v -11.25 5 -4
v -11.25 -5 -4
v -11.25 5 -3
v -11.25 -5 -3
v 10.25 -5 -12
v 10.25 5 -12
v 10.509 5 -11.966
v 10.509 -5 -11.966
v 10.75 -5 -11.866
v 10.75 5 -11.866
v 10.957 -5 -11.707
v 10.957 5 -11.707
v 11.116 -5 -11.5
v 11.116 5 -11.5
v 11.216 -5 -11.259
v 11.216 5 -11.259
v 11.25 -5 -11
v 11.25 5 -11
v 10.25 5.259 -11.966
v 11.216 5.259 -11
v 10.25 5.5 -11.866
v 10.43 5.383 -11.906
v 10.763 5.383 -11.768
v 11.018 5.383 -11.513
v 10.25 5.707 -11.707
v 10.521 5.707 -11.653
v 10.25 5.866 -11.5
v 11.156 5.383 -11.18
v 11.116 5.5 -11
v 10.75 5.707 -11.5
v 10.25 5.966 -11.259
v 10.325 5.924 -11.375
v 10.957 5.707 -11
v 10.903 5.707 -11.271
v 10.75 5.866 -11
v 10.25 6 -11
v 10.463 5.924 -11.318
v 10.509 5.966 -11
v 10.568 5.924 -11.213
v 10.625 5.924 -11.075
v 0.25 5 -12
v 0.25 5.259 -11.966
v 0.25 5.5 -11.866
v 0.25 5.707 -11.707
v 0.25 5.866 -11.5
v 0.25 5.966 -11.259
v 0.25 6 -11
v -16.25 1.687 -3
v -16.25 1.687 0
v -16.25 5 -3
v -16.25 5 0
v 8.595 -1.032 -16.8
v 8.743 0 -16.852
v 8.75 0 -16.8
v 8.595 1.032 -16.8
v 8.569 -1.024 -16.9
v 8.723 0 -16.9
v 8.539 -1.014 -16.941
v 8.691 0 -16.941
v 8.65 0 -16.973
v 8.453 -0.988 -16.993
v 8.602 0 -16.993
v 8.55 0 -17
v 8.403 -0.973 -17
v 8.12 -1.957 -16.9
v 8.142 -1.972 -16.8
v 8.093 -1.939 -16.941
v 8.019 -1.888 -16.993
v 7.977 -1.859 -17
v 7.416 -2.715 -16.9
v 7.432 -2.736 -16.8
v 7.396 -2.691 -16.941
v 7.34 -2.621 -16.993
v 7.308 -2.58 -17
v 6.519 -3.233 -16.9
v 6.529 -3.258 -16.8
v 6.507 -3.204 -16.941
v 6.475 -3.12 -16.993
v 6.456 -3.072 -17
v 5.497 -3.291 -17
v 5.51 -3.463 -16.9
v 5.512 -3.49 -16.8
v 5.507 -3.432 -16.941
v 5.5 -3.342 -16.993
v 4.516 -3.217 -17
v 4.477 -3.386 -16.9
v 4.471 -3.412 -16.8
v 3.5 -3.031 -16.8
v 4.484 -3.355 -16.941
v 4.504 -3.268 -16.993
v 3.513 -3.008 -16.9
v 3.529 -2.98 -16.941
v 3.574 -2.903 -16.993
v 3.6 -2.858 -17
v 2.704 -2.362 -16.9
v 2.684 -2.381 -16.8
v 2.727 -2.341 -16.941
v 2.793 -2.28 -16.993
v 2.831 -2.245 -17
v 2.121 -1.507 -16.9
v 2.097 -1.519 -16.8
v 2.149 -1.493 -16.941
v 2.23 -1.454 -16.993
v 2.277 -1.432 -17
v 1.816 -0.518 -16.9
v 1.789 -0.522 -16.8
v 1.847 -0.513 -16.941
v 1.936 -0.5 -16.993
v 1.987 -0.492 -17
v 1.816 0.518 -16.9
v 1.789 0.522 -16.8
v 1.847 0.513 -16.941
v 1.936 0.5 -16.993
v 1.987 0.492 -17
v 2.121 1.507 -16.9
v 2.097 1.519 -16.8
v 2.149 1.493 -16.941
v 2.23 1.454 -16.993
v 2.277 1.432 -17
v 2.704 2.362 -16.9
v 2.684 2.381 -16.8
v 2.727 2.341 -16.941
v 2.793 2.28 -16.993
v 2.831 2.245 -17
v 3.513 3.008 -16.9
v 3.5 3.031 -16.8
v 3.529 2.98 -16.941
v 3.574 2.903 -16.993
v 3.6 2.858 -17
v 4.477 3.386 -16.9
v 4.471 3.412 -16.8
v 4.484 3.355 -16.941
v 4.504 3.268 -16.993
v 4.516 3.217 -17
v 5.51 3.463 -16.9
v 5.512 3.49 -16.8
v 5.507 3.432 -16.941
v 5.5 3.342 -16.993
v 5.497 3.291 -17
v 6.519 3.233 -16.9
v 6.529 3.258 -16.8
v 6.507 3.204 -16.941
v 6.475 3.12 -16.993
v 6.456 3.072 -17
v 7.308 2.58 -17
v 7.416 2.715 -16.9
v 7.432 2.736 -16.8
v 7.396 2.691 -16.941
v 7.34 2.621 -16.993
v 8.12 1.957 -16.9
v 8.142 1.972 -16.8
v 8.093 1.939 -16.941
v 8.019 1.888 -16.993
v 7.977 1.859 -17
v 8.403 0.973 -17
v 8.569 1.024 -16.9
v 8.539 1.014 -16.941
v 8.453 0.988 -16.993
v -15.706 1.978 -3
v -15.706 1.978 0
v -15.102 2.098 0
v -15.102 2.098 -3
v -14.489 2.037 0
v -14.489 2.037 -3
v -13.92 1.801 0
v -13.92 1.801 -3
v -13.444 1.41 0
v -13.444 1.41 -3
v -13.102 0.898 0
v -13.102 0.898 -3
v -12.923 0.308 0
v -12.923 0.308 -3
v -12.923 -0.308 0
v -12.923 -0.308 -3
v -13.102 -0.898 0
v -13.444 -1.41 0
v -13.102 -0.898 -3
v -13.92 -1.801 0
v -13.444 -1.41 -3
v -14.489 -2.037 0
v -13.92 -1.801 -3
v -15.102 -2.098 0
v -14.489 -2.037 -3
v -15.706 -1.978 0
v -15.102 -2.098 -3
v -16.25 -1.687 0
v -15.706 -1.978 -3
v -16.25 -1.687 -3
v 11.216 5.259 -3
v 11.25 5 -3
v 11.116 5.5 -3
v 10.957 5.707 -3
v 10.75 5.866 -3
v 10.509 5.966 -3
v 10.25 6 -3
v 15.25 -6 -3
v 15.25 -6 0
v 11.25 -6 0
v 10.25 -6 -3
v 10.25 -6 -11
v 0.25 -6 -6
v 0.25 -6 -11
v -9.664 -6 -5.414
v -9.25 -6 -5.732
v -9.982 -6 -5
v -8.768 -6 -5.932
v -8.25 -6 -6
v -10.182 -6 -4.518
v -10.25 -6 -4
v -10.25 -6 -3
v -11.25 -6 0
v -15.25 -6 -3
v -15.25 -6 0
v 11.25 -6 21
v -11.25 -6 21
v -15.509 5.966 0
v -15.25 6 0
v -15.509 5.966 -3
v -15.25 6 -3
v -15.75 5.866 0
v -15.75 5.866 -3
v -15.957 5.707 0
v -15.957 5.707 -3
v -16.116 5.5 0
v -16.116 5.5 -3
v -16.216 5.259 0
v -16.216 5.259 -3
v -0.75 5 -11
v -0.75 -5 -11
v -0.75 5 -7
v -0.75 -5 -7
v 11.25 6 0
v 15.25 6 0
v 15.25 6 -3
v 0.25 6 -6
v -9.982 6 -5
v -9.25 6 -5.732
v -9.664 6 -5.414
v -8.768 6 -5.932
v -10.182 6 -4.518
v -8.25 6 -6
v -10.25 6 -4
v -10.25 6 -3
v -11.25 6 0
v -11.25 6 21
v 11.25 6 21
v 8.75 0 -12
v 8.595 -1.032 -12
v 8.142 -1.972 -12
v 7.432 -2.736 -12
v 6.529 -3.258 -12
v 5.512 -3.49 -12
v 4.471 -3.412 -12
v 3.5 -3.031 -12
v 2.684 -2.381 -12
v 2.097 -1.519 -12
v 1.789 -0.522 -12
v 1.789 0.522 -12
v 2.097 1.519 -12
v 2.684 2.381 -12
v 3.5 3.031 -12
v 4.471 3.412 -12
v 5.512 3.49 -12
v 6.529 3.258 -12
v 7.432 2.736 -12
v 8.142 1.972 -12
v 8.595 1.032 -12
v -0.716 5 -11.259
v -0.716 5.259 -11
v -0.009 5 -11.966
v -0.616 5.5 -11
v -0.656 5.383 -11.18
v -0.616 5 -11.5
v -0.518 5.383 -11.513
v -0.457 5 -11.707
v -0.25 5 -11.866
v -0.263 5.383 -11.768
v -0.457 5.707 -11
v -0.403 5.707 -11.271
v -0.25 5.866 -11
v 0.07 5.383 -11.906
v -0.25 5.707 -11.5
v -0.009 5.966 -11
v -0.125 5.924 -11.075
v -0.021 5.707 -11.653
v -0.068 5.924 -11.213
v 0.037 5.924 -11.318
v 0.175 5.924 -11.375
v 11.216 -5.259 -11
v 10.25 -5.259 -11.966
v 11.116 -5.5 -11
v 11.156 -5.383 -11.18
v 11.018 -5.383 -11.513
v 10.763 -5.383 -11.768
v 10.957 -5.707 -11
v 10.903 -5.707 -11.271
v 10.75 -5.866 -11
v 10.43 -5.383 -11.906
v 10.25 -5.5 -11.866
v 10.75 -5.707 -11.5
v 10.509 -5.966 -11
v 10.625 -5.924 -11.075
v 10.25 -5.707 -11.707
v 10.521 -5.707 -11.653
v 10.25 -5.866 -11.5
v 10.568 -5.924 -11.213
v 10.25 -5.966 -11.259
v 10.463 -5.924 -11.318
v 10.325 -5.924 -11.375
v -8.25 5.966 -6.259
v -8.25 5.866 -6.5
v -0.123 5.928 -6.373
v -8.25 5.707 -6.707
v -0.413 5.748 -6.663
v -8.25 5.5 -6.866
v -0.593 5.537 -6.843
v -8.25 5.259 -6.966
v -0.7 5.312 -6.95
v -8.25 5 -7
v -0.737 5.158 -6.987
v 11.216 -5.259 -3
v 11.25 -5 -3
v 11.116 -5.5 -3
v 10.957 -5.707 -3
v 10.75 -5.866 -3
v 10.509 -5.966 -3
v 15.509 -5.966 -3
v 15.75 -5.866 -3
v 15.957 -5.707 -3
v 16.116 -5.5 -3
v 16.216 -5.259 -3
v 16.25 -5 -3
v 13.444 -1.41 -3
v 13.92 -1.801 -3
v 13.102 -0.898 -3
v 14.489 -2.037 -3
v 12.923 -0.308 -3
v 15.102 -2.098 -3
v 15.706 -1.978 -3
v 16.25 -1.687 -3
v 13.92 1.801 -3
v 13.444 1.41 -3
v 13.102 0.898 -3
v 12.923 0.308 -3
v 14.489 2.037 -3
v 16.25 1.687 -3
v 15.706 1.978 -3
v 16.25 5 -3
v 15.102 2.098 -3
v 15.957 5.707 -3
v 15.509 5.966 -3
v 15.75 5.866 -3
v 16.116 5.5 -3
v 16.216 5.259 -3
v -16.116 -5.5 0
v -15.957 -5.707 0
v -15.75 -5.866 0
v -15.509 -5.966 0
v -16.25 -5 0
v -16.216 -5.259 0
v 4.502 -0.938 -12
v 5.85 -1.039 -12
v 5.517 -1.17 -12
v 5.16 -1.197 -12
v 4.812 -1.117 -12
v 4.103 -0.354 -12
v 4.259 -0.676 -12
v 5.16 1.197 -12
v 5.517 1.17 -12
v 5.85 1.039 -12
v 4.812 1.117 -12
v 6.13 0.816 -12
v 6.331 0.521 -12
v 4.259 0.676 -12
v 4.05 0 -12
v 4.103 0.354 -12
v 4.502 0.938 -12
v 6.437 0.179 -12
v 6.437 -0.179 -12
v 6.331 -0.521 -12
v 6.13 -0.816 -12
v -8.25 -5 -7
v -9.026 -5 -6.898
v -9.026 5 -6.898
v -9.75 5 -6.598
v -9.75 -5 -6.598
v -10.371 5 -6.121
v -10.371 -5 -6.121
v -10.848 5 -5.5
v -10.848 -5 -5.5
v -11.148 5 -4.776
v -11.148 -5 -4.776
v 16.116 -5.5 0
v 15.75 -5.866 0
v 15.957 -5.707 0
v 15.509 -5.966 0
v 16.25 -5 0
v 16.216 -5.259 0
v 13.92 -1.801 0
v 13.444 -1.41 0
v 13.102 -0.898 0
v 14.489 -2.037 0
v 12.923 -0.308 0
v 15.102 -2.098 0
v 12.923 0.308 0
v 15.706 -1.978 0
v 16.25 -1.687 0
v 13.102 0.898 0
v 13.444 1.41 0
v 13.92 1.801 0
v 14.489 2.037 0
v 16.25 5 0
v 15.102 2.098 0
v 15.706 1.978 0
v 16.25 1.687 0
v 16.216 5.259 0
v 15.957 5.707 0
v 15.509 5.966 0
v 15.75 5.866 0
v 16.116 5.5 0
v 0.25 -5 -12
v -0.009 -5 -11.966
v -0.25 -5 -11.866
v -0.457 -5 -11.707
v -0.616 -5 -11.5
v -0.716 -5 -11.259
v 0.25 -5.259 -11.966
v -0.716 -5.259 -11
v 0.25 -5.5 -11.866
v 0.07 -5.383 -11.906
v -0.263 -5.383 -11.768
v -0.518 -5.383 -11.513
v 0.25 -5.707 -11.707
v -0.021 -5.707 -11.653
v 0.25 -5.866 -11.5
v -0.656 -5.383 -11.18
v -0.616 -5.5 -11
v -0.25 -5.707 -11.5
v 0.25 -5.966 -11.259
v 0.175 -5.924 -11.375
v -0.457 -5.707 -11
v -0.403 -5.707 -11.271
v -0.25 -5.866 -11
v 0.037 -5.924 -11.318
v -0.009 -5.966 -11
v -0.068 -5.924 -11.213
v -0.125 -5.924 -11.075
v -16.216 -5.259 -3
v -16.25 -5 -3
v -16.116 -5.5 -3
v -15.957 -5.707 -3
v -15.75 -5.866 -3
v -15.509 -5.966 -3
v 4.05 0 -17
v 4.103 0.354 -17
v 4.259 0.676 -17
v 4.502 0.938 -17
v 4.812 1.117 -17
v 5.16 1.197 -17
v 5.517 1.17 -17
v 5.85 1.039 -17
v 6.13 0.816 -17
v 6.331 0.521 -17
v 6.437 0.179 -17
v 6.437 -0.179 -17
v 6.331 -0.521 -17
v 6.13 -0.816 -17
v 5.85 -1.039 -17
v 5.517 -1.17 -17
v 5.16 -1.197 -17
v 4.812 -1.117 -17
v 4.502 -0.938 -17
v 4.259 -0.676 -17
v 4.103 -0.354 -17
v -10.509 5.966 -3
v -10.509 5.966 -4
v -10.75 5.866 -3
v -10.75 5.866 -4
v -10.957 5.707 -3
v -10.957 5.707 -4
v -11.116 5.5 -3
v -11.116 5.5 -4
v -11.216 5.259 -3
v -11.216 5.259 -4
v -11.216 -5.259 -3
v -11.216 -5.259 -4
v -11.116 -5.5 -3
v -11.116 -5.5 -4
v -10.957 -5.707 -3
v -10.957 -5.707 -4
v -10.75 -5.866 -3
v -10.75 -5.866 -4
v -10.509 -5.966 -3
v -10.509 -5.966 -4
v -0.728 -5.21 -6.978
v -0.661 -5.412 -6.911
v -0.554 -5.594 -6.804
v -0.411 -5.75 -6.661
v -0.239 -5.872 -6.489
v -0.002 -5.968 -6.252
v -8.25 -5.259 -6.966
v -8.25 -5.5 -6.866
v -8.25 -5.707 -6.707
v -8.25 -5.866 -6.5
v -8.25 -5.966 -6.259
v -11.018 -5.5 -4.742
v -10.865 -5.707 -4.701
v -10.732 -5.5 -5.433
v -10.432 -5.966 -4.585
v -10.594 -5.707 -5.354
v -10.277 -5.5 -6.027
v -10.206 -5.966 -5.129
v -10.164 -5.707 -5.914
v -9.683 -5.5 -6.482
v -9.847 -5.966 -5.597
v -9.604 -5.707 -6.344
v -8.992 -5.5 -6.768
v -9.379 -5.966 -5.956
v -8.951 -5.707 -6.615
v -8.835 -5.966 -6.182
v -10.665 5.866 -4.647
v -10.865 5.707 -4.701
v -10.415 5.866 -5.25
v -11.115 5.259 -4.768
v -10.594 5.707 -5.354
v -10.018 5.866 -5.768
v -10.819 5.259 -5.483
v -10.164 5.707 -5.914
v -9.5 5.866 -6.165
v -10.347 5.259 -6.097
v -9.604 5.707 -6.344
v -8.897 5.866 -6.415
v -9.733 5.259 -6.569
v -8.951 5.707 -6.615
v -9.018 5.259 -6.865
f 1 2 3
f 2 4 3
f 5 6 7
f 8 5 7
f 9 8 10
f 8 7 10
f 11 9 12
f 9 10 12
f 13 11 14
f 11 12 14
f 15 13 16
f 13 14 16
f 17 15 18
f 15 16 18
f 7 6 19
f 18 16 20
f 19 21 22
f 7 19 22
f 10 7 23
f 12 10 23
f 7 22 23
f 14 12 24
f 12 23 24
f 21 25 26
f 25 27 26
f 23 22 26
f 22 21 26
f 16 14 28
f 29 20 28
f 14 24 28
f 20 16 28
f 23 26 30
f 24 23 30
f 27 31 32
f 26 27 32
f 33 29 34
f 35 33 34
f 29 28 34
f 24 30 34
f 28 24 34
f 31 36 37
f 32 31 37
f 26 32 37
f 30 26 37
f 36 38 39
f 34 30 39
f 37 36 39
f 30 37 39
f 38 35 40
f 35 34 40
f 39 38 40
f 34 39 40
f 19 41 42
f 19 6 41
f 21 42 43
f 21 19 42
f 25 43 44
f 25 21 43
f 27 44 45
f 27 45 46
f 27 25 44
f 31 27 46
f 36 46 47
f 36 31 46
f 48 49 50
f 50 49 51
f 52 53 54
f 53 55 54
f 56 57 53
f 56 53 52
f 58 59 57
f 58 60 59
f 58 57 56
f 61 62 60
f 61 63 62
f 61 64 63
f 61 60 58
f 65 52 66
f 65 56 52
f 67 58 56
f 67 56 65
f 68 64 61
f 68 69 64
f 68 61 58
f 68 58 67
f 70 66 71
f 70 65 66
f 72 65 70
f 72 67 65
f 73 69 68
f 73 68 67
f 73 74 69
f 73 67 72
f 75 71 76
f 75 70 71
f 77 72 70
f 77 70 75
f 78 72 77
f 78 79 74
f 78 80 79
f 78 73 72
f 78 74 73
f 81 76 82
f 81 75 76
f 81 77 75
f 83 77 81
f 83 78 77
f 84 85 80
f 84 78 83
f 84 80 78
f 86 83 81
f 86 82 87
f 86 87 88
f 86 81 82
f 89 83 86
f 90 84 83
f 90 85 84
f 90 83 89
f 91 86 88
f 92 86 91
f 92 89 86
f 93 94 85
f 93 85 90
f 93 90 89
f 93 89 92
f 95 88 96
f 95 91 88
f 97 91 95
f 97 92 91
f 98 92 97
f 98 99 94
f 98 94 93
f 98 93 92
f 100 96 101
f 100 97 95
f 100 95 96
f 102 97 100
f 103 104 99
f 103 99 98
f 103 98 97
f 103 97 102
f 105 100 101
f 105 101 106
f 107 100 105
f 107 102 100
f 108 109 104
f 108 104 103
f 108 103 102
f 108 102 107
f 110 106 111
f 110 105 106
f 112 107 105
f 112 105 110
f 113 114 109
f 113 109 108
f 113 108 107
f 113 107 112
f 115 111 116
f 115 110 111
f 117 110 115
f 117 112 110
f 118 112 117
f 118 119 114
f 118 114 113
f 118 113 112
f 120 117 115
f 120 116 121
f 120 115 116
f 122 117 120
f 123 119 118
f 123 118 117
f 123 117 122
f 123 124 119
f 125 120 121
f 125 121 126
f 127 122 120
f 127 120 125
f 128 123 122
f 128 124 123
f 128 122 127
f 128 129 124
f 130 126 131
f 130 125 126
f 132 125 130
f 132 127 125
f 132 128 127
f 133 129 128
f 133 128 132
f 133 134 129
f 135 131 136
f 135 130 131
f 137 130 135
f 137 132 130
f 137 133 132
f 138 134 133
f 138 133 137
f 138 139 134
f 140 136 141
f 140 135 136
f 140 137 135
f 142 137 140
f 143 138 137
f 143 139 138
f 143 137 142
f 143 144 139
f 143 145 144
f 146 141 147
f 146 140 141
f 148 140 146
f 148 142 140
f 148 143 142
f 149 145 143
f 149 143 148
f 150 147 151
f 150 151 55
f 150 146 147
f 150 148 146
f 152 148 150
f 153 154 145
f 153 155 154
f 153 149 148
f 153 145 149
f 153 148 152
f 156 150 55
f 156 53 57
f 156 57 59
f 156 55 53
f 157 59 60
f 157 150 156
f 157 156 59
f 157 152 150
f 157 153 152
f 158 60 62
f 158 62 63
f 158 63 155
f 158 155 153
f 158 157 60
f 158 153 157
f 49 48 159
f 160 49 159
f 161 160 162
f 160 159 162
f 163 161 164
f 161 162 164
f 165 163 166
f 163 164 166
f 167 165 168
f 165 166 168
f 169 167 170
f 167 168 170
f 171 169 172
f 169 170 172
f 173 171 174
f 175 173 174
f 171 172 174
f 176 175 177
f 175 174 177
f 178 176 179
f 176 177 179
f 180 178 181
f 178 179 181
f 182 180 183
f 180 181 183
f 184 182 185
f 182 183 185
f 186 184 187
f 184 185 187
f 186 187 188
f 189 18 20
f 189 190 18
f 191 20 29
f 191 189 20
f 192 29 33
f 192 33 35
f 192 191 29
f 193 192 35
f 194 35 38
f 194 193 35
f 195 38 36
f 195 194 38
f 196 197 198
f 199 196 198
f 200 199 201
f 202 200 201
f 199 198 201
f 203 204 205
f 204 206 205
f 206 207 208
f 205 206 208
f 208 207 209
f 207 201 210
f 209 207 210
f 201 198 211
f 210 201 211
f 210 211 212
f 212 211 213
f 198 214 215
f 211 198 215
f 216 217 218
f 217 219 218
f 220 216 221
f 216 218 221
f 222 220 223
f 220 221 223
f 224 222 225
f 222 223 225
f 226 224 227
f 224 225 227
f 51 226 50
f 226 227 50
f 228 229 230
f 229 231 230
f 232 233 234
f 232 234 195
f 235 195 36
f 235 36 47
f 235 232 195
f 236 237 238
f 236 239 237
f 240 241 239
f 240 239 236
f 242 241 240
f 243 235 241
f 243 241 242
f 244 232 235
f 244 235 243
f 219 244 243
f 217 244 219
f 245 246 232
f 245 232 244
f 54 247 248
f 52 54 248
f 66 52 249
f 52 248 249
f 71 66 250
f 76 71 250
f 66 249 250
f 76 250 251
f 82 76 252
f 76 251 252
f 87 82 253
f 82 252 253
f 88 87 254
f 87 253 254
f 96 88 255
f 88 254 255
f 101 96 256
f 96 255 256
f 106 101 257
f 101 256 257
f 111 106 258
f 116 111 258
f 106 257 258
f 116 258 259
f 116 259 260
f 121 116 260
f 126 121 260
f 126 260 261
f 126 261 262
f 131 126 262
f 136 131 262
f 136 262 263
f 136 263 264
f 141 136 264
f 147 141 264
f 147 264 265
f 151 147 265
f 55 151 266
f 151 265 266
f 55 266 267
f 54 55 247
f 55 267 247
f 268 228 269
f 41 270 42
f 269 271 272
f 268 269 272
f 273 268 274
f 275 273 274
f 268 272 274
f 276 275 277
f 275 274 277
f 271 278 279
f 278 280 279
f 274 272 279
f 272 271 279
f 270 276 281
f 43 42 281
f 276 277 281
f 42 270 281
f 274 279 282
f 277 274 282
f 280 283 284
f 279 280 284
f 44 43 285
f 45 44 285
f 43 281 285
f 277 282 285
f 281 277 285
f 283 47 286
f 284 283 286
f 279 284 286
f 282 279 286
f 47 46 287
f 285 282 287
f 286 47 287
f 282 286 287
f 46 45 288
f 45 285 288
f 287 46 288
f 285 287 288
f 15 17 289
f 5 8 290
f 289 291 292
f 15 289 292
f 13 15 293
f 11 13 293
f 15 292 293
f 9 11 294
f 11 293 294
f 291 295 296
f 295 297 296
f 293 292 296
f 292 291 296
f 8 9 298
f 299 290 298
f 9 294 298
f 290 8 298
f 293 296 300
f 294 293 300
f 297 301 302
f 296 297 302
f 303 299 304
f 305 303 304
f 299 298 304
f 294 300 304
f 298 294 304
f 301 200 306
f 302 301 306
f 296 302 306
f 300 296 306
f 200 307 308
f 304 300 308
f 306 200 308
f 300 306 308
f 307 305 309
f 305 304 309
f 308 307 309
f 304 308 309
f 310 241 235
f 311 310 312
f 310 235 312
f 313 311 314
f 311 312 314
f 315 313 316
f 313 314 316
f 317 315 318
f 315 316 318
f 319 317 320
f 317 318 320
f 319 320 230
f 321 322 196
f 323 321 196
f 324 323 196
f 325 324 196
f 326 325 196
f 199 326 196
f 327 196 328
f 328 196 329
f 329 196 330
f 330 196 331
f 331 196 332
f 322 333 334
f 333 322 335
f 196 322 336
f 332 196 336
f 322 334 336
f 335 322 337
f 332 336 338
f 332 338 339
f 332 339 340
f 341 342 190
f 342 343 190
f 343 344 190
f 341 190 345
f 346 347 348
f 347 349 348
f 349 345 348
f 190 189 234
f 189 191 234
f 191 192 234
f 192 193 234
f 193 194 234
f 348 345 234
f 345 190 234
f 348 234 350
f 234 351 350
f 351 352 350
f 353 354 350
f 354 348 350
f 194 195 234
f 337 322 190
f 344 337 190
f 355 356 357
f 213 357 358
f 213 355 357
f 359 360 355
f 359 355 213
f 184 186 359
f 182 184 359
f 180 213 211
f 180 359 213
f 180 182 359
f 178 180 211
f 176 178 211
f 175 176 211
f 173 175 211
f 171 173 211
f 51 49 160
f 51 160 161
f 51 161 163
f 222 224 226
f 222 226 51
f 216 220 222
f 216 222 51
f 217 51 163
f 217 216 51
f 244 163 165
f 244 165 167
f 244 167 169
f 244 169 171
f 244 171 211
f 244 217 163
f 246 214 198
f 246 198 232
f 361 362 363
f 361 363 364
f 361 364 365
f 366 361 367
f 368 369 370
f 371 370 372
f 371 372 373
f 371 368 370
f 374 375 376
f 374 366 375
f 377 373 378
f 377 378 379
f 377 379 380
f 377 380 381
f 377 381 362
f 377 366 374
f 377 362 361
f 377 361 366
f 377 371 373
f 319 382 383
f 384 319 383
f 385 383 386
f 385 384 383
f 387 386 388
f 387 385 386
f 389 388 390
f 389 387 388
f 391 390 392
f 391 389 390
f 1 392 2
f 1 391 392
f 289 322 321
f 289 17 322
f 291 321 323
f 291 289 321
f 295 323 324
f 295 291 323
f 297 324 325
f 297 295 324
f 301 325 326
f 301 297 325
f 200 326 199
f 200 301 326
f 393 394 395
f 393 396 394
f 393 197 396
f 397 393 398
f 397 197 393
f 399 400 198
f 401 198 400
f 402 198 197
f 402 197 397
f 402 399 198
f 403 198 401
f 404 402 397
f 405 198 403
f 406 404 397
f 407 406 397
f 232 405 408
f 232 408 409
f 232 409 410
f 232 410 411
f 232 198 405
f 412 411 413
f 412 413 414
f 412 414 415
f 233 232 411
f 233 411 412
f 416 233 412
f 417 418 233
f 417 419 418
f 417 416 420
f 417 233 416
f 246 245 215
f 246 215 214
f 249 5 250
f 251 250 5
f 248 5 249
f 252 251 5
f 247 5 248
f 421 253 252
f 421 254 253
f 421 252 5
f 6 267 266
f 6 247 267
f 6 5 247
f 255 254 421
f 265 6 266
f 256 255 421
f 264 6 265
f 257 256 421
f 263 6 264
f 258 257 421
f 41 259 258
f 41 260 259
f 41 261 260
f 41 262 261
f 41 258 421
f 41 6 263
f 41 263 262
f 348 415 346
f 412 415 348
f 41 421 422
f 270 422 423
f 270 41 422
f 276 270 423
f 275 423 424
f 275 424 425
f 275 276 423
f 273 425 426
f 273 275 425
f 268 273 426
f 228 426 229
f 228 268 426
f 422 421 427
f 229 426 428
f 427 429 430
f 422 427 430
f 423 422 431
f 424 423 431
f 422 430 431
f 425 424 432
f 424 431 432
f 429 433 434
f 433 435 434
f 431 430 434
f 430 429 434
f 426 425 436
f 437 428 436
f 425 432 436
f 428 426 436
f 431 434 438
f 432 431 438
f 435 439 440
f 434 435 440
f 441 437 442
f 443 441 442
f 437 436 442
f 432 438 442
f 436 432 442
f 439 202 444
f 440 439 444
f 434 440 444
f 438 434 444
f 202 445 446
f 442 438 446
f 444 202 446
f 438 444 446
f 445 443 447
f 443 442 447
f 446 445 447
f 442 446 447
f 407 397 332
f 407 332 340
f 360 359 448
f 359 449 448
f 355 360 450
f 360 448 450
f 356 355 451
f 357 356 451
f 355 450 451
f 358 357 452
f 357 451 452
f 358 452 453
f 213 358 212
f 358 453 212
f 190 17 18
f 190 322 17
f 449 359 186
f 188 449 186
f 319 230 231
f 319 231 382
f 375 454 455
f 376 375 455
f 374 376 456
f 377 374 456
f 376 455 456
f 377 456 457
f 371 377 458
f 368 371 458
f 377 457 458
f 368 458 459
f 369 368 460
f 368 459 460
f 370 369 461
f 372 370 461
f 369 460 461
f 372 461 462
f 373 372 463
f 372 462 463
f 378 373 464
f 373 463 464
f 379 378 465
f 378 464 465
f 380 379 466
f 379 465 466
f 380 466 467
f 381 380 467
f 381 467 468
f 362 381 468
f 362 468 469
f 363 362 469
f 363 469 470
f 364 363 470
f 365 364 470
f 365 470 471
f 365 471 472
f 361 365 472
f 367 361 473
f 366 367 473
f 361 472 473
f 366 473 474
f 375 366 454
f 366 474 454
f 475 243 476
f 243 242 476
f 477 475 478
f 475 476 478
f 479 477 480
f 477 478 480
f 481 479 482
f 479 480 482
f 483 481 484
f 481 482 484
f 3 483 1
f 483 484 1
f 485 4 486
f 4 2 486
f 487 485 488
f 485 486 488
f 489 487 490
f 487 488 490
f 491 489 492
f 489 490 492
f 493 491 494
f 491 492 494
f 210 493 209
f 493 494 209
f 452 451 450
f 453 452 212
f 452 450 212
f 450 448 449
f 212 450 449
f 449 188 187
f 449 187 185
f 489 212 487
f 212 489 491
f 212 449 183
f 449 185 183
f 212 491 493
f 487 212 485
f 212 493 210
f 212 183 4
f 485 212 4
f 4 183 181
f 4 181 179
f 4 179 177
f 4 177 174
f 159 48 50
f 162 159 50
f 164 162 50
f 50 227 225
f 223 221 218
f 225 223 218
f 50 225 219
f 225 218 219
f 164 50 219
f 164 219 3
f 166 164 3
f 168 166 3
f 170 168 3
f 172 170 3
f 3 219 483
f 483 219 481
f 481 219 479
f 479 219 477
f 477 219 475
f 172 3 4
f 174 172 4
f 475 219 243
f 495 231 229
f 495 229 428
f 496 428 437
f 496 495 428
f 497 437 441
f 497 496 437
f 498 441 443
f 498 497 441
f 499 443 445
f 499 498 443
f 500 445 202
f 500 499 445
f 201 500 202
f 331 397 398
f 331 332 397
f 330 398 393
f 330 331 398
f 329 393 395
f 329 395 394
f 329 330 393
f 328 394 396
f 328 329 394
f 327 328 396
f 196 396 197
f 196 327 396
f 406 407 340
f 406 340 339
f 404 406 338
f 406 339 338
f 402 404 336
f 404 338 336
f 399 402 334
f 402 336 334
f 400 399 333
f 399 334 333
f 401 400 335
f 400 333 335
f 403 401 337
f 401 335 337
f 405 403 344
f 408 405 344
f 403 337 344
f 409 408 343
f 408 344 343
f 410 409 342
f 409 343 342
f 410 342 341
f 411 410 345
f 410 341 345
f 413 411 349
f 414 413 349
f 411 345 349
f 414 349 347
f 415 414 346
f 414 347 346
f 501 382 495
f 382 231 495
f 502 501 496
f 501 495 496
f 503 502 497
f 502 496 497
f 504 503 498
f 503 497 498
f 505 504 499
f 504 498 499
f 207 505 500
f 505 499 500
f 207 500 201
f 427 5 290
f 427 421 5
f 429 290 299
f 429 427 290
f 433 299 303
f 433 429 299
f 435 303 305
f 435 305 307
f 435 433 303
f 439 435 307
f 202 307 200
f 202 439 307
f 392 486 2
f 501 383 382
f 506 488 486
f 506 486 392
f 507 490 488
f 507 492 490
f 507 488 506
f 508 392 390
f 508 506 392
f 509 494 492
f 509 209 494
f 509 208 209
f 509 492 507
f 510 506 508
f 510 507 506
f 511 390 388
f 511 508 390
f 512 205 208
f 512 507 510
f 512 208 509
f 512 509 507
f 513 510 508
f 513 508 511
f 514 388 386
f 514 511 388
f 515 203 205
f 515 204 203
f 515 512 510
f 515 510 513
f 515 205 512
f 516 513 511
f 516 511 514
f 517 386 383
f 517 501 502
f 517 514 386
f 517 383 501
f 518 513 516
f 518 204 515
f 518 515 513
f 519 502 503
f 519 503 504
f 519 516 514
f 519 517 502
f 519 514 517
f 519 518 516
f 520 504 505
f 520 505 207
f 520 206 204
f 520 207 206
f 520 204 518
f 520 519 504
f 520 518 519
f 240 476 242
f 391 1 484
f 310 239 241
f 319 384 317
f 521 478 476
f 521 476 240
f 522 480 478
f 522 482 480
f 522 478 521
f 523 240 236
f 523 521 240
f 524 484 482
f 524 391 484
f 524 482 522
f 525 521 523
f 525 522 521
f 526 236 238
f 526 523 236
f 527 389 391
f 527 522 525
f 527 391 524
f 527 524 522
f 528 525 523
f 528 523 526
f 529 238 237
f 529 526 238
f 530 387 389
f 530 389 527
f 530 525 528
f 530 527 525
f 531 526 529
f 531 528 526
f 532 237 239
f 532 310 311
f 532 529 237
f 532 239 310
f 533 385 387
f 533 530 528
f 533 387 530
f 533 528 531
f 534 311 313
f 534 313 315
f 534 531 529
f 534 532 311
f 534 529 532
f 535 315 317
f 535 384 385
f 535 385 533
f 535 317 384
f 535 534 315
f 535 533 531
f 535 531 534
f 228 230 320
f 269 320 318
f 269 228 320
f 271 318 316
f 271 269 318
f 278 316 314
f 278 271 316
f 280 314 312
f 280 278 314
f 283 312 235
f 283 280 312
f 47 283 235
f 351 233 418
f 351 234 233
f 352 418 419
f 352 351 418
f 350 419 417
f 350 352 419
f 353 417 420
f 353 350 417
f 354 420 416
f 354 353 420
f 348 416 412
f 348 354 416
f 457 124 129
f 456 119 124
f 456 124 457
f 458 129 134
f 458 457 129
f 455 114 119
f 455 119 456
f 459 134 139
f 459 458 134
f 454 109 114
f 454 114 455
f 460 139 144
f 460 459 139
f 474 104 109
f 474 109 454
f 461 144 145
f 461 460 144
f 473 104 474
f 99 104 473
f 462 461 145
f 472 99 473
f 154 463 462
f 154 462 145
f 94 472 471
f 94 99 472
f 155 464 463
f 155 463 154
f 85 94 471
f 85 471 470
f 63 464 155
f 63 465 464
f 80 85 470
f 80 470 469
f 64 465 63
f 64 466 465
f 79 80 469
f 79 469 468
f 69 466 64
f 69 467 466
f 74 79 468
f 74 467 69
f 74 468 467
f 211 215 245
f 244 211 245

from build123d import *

# Parameters (mm, degrees)
SKETCH1_W           = 22.5
SKETCH1_H           = 12
BOSS_EXTRUDE1_DEPTH = 21
SKETCH2_W           = 32.5
SKETCH2_H           = 12
BOSS_EXTRUDE2_DEPTH = 3
SKETCH3_W           = 22.5
SKETCH3_H           = 12
BOSS_EXTRUDE6_DEPTH = 4
SKETCH5_W           = 12
SKETCH5_H           = 12
BOSS_EXTRUDE7_DEPTH = 5
SKETCH6_R           = 3.5
BOSS_EXTRUDE8_DEPTH = 5
SKETCH7_R           = 1.2
CUT_EXTRUDE1_DEPTH  = 5
FILLET3_R           = 3
FILLET4_R           = 1
FILLET5_R           = 1
FILLET6_R           = 1
FILLET7_R           = 1
FILLET8_R           = 1
FILLET9_R           = 1
FILLET10_R          = 0.2
SKETCH14_R          = 2.1
CUT_EXTRUDE4_DEPTH  = 5
SKETCH13_R          = 2.1
CUT_EXTRUDE5_DEPTH  = 5
FILLET11_R          = 1


with BuildPart() as part:
    # Sketch1 → Boss-Extrude1 (new body)
    with BuildSketch(Plane.XY):
        Rectangle(SKETCH1_W, SKETCH1_H)
    extrude(amount=BOSS_EXTRUDE1_DEPTH)

    # Sketch2 → Boss-Extrude2 (add)
    with BuildSketch(Plane.XY):
        Rectangle(SKETCH2_W, SKETCH2_H)
    extrude(amount=-BOSS_EXTRUDE2_DEPTH)

    # Sketch3 → Boss-Extrude6 (add)
    with BuildSketch(Plane(origin=(0, 0, -3), x_dir=(-1, 0, 0), z_dir=(0, 0, -1))):
        Rectangle(SKETCH3_W, SKETCH3_H)
    extrude(amount=BOSS_EXTRUDE6_DEPTH)

    # Sketch5 → Boss-Extrude7 (add)
    with BuildSketch(Plane(origin=(0, 0, -7), x_dir=(-1, 0, 0), z_dir=(0, 0, -1))):
        with Locations((-5.25, 0)):
            Rectangle(SKETCH5_W, SKETCH5_H)
    extrude(amount=BOSS_EXTRUDE7_DEPTH)

    # Sketch6 → Boss-Extrude8 (add)
    with BuildSketch(Plane(origin=(0, 0, -12), x_dir=(-1, 0, 0), z_dir=(0, 0, -1))):
        with Locations(Location((-5.25, 0, 0), (0, 0, 180))):
            Circle(SKETCH6_R)
    extrude(amount=BOSS_EXTRUDE8_DEPTH)

    # Sketch7 → Cut-Extrude1 (cut)
    with BuildSketch(Plane(origin=(0, 0, -17), x_dir=(-1, 0, 0), z_dir=(0, 0, -1))):
        with Locations((-5.25, 0)):
            Circle(SKETCH7_R)
    extrude(amount=-CUT_EXTRUDE1_DEPTH, mode=Mode.SUBTRACT)

    # Fillet3
    fillet3_edges = [part.edges().sort_by_distance(p)[0] for p in [
        (-11.25, 0, -7),
    ]]
    fillet(fillet3_edges, radius=FILLET3_R)

    # Fillet4
    fillet4_edges = [part.edges().sort_by_distance(p)[0] for p in [
        (11.25, 0, -12),
    ]]
    fillet(fillet4_edges, radius=FILLET4_R)

    # Fillet5
    fillet5_edges = [part.edges().sort_by_distance(p)[0] for p in [
        (-0.75, 0, -12),
    ]]
    fillet(fillet5_edges, radius=FILLET5_R)

    # Fillet6
    fillet6_edges = [part.edges().sort_by_distance(p)[0] for p in [
        (11.25, -6, -7),
        (10.957106781, -6, -11.707106781),
        (-0.75, -6, -9),
        (-0.457106781, -6, -11.707106781),
        (5.25, -6, -12),
    ]]
    fillet(fillet6_edges, radius=FILLET6_R)

    # Fillet7
    fillet7_edges = [part.edges().sort_by_distance(p)[0] for p in [
        (11.25, 6, -7),
        (10.957106781, 6, -11.707106781),
        (-0.75, 6, -9),
        (-0.457106781, 6, -11.707106781),
        (5.25, 6, -12),
    ]]
    fillet(fillet7_edges, radius=FILLET7_R)

    # Fillet8
    fillet8_edges = [part.edges().sort_by_distance(p)[0] for p in [
        (-11.25, 6, -3.5),
        (-10.371320344, 6, -6.121320344),
        (-4, 6, -7),
    ]]
    fillet(fillet8_edges, radius=FILLET8_R)

    # Fillet9
    fillet9_edges = [part.edges().sort_by_distance(p)[0] for p in [
        (-11.25, -6, -3.5),
        (-10.371320344, -6, -6.121320344),
        (-4, -6, -7),
    ]]
    fillet(fillet9_edges, radius=FILLET9_R)

    # Fillet10
    fillet10_edges = [part.edges().sort_by_distance(p)[0] for p in [
        (1.75, 0, -17),
    ]]
    fillet(fillet10_edges, radius=FILLET10_R)

    # Sketch14 → Cut-Extrude4 (cut)
    with BuildSketch(Plane(origin=(0, 0, -3), x_dir=(-1, 0, 0), z_dir=(0, 0, -1))):
        with Locations((15, 0)):
            Circle(SKETCH14_R)
    extrude(amount=-CUT_EXTRUDE4_DEPTH, mode=Mode.SUBTRACT)

    # Sketch13 → Cut-Extrude5 (cut)
    with BuildSketch(Plane(origin=(0, 0, -3), x_dir=(-1, 0, 0), z_dir=(0, 0, -1))):
        with Locations((-15, 0)):
            Circle(SKETCH13_R)
    extrude(amount=-CUT_EXTRUDE5_DEPTH, mode=Mode.SUBTRACT)

    # Fillet11
    fillet11_edges = [part.edges().sort_by_distance(p)[0] for p in [
        (-16.25, -6, -1.5),
        (-16.25, 6, -1.5),
        (16.25, -6, -1.5),
        (16.25, 6, -1.5),
    ]]
    fillet(fillet11_edges, radius=FILLET11_R)


solid = part.part
